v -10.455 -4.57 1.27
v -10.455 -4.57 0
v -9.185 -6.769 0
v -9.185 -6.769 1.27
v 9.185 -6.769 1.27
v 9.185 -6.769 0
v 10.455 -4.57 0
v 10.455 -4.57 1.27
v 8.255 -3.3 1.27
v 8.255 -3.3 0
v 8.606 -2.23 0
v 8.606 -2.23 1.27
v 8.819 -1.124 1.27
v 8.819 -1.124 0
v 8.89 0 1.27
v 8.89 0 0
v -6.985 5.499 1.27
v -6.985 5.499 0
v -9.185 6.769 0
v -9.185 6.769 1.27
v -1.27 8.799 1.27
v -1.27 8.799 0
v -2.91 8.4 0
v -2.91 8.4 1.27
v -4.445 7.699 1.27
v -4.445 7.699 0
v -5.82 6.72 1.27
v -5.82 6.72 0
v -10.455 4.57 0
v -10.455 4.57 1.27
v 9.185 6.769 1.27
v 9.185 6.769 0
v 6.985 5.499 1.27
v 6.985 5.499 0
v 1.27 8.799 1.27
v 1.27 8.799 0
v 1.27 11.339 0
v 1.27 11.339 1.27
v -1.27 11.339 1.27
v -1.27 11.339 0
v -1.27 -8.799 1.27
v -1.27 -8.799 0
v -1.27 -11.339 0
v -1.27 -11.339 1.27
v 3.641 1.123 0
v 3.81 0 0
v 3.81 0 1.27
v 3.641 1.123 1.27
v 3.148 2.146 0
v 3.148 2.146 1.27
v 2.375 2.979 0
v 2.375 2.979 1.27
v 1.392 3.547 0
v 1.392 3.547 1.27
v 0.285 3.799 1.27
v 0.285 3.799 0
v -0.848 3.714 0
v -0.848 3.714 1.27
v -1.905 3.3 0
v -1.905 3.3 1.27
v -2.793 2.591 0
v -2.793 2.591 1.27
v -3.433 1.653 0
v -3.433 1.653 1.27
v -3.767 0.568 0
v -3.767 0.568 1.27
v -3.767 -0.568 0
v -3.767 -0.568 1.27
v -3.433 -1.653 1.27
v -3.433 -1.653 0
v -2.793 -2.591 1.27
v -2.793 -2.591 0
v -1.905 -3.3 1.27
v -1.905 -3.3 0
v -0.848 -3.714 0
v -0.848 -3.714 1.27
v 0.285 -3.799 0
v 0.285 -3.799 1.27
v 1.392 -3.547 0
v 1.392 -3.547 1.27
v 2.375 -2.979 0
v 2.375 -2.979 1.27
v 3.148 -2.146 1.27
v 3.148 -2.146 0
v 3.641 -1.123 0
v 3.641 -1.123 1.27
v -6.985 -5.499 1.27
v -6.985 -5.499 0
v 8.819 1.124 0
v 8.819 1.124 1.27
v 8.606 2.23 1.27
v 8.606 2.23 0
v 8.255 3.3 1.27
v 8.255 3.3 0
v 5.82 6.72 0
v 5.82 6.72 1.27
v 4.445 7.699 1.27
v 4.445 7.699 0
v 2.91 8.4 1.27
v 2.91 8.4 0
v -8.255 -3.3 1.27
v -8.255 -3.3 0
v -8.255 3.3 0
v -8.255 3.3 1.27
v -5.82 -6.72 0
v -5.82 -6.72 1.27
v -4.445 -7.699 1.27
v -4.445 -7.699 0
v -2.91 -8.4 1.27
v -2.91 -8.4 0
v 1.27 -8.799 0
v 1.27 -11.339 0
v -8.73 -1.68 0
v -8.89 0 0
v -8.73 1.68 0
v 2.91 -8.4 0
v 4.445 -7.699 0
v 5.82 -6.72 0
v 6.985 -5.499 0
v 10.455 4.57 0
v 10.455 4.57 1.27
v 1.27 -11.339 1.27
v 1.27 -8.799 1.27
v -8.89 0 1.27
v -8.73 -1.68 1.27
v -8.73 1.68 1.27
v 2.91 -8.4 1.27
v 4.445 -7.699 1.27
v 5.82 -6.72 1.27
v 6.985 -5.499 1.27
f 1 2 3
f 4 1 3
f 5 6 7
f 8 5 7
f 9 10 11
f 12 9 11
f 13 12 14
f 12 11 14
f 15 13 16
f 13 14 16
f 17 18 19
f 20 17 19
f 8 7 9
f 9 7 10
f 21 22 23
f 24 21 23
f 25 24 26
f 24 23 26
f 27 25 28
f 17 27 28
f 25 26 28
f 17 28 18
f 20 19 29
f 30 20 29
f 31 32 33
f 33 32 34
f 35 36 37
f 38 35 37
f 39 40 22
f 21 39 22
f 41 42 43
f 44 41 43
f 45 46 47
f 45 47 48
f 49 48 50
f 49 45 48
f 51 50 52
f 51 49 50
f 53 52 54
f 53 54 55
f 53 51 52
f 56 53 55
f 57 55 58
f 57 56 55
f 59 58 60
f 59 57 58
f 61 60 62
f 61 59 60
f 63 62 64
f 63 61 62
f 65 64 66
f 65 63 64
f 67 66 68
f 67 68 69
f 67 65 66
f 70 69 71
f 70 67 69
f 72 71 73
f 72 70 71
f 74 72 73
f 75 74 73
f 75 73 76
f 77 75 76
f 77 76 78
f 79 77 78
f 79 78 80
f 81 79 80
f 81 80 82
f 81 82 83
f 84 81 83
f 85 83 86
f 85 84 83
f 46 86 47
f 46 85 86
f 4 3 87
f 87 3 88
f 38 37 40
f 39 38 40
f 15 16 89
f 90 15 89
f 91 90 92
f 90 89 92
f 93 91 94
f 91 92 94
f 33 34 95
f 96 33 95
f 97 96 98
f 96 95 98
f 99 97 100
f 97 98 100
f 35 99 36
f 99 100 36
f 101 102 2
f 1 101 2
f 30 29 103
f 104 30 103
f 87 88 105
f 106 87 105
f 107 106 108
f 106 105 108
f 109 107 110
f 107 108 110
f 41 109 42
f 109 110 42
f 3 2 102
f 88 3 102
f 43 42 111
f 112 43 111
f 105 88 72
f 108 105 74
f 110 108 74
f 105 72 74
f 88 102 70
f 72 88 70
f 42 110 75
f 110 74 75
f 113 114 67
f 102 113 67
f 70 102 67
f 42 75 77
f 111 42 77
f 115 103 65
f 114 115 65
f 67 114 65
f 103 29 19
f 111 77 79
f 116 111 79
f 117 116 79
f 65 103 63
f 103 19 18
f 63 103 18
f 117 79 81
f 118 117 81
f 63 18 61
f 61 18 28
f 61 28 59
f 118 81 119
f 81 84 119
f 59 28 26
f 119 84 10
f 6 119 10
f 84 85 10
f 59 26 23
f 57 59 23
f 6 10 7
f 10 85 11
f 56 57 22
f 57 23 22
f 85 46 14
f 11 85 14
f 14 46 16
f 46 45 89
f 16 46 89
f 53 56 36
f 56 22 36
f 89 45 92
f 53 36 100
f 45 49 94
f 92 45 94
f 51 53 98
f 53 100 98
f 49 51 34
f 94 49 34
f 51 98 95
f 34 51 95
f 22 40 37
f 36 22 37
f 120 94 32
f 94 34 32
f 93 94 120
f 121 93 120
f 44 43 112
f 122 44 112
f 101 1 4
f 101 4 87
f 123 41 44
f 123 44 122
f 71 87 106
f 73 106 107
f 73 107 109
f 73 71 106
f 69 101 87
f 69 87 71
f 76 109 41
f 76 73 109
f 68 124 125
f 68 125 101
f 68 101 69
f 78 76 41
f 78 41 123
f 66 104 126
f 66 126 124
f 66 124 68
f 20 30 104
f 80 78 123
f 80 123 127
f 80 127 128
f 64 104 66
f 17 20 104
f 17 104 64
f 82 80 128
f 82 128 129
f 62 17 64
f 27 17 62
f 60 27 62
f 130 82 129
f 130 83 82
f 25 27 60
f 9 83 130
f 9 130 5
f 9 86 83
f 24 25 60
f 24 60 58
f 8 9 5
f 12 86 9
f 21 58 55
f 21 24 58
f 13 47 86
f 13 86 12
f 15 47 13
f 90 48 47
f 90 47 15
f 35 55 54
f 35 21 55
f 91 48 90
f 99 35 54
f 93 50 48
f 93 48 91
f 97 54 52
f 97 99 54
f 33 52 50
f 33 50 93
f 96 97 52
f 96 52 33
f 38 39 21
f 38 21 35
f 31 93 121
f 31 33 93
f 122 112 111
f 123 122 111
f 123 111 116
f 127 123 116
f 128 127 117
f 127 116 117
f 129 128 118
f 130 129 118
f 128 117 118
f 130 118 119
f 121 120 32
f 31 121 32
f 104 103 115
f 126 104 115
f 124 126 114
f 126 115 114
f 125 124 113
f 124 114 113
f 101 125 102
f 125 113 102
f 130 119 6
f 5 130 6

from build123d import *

# Parameters (mm, degrees)
F0_R     = 3.81
F1_DEPTH = 1.27


with BuildPart() as f1:
    # F0 (on Top) → F1 (new body)
    with BuildSketch(Plane.XY):
        with BuildLine():
            ThreePointArc((8.255, -3.299557), (8.729807, -1.680052), (8.89, 0))
            ThreePointArc((8.89, 0), (8.729807, 1.680052), (8.255, 3.299557))
            ThreePointArc((8.255, 3.299557), (7.698966, 4.445), (6.985, 5.499261))
            ThreePointArc((6.985, 5.499261), (4.445, 7.698966), (1.27, 8.798818))
            ThreePointArc((1.27, 8.798818), (0, 8.89), (-1.27, 8.798818))
            ThreePointArc((-1.27, 8.798818), (-4.445, 7.698966), (-6.985, 5.499261))
            ThreePointArc((-6.985, 5.499261), (-7.698966, 4.445), (-8.255, 3.299557))
            ThreePointArc((-8.255, 3.299557), (-8.89, 0), (-8.255, -3.299557))
            ThreePointArc((-8.255, -3.299557), (-7.698966, -4.445), (-6.985, -5.499261))
            ThreePointArc((-6.985, -5.499261), (-4.445, -7.698966), (-1.27, -8.798818))
            ThreePointArc((-1.27, -8.798818), (0, -8.89), (1.27, -8.798818))
            ThreePointArc((1.27, -8.798818), (4.445, -7.698966), (6.985, -5.499261))
            ThreePointArc((6.985, -5.499261), (7.698966, -4.445), (8.255, -3.299557))
        make_face()
        Circle(F0_R, mode=Mode.SUBTRACT)
        with BuildLine():
            ThreePointArc((-1.27, 8.798818), (0, 8.89), (1.27, 8.798818))
            Line((1.27, 8.798818), (1.27, 11.338818))
            Line((1.27, 11.338818), (-1.27, 11.338818))
            Line((-1.27, 11.338818), (-1.27, 8.798818))
        make_face()
        with BuildLine():
            ThreePointArc((6.985, 5.499261), (7.698966, 4.445), (8.255, 3.299557))
            Line((8.255, 3.299557), (10.454705, 4.569557))
            Line((10.454705, 4.569557), (9.184705, 6.769261))
            Line((9.184705, 6.769261), (6.985, 5.499261))
        make_face()
        with BuildLine():
            Line((10.454705, -4.569557), (8.255, -3.299557))
            ThreePointArc((8.255, -3.299557), (7.698966, -4.445), (6.985, -5.499261))
            Line((6.985, -5.499261), (9.184705, -6.769261))
            Line((9.184705, -6.769261), (10.454705, -4.569557))
        make_face()
        with BuildLine():
            Line((1.27, -11.338818), (1.27, -8.798818))
            ThreePointArc((1.27, -8.798818), (0, -8.89), (-1.27, -8.798818))
            Line((-1.27, -8.798818), (-1.27, -11.338818))
            Line((-1.27, -11.338818), (1.27, -11.338818))
        make_face()
        with BuildLine():
            Line((-9.184705, -6.769261), (-6.985, -5.499261))
            ThreePointArc((-6.985, -5.499261), (-7.698966, -4.445), (-8.255, -3.299557))
            Line((-8.255, -3.299557), (-10.454705, -4.569557))
            Line((-10.454705, -4.569557), (-9.184705, -6.769261))
        make_face()
        with BuildLine():
            ThreePointArc((-8.255, 3.299557), (-7.698966, 4.445), (-6.985, 5.499261))
            Line((-6.985, 5.499261), (-9.184705, 6.769261))
            Line((-9.184705, 6.769261), (-10.454705, 4.569557))
            Line((-10.454705, 4.569557), (-8.255, 3.299557))
        make_face()
    extrude(amount=F1_DEPTH)


solid = f1.part
